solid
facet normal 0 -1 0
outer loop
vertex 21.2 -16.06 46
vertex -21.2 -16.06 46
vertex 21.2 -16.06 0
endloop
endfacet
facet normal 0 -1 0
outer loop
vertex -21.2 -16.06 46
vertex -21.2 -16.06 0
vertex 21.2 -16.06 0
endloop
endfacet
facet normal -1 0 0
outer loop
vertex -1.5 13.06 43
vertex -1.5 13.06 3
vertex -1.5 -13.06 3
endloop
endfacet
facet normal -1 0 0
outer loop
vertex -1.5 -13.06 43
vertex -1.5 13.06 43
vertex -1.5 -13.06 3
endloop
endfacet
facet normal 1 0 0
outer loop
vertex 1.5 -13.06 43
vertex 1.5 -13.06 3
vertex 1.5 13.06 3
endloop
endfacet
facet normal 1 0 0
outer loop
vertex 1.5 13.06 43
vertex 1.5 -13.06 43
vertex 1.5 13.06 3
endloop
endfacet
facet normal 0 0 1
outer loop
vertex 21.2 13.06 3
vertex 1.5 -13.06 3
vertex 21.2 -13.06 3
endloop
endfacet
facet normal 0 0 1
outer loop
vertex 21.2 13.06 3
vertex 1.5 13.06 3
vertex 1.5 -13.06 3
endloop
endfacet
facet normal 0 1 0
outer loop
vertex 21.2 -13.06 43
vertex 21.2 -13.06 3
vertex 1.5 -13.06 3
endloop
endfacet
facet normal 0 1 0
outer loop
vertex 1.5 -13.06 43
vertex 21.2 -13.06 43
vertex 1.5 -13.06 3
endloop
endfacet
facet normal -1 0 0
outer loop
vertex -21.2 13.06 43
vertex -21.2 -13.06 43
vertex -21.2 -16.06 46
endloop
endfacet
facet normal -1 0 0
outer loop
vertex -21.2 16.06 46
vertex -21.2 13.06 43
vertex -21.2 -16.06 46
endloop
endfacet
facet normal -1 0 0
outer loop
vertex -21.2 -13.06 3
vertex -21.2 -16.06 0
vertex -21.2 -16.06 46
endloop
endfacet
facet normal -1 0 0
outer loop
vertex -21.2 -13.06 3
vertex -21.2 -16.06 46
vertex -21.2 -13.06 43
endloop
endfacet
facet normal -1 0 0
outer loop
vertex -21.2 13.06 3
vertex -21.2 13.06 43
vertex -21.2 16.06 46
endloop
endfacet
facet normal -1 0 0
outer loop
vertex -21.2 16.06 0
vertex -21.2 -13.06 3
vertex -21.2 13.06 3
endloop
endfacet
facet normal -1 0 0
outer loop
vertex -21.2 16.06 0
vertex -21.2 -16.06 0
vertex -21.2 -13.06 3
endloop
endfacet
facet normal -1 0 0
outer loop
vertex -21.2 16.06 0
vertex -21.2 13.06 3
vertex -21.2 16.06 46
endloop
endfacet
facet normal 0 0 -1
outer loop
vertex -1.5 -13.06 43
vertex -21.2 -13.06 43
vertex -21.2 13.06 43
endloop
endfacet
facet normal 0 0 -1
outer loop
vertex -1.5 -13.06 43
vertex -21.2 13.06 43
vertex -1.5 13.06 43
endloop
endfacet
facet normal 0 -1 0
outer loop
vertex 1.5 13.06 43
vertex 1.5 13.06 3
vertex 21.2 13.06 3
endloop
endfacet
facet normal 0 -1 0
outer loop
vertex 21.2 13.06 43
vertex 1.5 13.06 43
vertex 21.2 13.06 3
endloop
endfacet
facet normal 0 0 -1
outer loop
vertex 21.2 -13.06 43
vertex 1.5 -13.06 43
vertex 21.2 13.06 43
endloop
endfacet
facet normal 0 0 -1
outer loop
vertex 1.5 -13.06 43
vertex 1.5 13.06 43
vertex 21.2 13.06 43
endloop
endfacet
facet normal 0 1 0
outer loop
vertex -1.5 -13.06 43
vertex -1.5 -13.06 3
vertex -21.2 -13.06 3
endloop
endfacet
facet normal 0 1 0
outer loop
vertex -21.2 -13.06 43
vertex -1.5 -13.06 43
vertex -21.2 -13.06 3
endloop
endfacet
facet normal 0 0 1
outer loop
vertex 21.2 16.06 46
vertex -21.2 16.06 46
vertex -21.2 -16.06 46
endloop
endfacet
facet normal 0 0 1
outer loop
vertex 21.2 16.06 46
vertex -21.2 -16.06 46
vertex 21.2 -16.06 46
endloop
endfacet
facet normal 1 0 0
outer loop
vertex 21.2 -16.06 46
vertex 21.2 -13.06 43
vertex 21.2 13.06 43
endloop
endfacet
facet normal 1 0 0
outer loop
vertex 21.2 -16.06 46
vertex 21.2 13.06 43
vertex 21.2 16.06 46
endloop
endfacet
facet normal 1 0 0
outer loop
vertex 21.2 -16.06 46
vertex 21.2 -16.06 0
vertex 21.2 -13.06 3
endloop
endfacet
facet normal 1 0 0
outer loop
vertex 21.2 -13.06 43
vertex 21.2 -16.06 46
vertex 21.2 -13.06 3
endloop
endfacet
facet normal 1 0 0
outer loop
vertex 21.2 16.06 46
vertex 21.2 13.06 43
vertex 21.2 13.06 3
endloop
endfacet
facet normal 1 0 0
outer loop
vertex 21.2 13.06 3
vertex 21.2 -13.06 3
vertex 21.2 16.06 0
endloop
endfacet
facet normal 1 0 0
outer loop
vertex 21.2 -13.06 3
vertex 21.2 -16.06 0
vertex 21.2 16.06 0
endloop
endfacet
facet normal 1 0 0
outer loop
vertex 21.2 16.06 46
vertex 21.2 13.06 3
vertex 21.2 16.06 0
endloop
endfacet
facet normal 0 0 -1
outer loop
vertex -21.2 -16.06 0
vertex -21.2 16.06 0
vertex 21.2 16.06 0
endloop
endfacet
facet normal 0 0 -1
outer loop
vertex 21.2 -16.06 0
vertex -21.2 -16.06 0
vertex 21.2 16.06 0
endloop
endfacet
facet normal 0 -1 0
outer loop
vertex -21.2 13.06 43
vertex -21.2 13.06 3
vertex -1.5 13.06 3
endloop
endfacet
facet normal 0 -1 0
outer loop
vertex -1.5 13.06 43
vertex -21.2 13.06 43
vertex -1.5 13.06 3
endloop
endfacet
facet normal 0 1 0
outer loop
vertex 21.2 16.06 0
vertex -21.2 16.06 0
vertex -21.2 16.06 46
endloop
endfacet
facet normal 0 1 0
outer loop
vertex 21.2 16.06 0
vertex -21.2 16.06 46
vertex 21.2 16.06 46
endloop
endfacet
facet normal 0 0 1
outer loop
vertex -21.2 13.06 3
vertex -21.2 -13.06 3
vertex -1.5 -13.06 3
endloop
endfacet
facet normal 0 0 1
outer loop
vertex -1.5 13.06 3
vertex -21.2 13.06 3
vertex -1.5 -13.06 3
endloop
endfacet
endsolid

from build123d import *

# Parameters (mm, degrees)
SKETCH1_W           = 42.4
SKETCH1_H           = 32.12
BOSS_EXTRUDE1_DEPTH = 3
BOSS_EXTRUDE2_DEPTH = 40
SKETCH3_W           = 42.4
SKETCH3_H           = 32.12
BOSS_EXTRUDE3_DEPTH = 3


with BuildPart() as part:
    # Sketch1 → Boss-Extrude1 (new body)
    with BuildSketch(Plane.XY):
        Rectangle(SKETCH1_W, SKETCH1_H)
    extrude(amount=BOSS_EXTRUDE1_DEPTH)

    # Sketch2 → Boss-Extrude2 (add)
    with BuildSketch(Plane.XY.offset(3)):
        Polygon((-21.2, 16.06), (-21.2, 13.06), (-1.5, 13.06), (-1.5, -13.06), (-21.2, -13.06), (-21.2, -16.06), (21.2, -16.06), (21.2, -13.06), (1.5, -13.06), (1.5, 13.06), (21.2, 13.06), (21.2, 16.06), align=None)
    extrude(amount=BOSS_EXTRUDE2_DEPTH)

    # Sketch3 → Boss-Extrude3 (add)
    with BuildSketch(Plane.XY.offset(43)):
        Rectangle(SKETCH3_W, SKETCH3_H)
    extrude(amount=BOSS_EXTRUDE3_DEPTH)


solid = part.part
